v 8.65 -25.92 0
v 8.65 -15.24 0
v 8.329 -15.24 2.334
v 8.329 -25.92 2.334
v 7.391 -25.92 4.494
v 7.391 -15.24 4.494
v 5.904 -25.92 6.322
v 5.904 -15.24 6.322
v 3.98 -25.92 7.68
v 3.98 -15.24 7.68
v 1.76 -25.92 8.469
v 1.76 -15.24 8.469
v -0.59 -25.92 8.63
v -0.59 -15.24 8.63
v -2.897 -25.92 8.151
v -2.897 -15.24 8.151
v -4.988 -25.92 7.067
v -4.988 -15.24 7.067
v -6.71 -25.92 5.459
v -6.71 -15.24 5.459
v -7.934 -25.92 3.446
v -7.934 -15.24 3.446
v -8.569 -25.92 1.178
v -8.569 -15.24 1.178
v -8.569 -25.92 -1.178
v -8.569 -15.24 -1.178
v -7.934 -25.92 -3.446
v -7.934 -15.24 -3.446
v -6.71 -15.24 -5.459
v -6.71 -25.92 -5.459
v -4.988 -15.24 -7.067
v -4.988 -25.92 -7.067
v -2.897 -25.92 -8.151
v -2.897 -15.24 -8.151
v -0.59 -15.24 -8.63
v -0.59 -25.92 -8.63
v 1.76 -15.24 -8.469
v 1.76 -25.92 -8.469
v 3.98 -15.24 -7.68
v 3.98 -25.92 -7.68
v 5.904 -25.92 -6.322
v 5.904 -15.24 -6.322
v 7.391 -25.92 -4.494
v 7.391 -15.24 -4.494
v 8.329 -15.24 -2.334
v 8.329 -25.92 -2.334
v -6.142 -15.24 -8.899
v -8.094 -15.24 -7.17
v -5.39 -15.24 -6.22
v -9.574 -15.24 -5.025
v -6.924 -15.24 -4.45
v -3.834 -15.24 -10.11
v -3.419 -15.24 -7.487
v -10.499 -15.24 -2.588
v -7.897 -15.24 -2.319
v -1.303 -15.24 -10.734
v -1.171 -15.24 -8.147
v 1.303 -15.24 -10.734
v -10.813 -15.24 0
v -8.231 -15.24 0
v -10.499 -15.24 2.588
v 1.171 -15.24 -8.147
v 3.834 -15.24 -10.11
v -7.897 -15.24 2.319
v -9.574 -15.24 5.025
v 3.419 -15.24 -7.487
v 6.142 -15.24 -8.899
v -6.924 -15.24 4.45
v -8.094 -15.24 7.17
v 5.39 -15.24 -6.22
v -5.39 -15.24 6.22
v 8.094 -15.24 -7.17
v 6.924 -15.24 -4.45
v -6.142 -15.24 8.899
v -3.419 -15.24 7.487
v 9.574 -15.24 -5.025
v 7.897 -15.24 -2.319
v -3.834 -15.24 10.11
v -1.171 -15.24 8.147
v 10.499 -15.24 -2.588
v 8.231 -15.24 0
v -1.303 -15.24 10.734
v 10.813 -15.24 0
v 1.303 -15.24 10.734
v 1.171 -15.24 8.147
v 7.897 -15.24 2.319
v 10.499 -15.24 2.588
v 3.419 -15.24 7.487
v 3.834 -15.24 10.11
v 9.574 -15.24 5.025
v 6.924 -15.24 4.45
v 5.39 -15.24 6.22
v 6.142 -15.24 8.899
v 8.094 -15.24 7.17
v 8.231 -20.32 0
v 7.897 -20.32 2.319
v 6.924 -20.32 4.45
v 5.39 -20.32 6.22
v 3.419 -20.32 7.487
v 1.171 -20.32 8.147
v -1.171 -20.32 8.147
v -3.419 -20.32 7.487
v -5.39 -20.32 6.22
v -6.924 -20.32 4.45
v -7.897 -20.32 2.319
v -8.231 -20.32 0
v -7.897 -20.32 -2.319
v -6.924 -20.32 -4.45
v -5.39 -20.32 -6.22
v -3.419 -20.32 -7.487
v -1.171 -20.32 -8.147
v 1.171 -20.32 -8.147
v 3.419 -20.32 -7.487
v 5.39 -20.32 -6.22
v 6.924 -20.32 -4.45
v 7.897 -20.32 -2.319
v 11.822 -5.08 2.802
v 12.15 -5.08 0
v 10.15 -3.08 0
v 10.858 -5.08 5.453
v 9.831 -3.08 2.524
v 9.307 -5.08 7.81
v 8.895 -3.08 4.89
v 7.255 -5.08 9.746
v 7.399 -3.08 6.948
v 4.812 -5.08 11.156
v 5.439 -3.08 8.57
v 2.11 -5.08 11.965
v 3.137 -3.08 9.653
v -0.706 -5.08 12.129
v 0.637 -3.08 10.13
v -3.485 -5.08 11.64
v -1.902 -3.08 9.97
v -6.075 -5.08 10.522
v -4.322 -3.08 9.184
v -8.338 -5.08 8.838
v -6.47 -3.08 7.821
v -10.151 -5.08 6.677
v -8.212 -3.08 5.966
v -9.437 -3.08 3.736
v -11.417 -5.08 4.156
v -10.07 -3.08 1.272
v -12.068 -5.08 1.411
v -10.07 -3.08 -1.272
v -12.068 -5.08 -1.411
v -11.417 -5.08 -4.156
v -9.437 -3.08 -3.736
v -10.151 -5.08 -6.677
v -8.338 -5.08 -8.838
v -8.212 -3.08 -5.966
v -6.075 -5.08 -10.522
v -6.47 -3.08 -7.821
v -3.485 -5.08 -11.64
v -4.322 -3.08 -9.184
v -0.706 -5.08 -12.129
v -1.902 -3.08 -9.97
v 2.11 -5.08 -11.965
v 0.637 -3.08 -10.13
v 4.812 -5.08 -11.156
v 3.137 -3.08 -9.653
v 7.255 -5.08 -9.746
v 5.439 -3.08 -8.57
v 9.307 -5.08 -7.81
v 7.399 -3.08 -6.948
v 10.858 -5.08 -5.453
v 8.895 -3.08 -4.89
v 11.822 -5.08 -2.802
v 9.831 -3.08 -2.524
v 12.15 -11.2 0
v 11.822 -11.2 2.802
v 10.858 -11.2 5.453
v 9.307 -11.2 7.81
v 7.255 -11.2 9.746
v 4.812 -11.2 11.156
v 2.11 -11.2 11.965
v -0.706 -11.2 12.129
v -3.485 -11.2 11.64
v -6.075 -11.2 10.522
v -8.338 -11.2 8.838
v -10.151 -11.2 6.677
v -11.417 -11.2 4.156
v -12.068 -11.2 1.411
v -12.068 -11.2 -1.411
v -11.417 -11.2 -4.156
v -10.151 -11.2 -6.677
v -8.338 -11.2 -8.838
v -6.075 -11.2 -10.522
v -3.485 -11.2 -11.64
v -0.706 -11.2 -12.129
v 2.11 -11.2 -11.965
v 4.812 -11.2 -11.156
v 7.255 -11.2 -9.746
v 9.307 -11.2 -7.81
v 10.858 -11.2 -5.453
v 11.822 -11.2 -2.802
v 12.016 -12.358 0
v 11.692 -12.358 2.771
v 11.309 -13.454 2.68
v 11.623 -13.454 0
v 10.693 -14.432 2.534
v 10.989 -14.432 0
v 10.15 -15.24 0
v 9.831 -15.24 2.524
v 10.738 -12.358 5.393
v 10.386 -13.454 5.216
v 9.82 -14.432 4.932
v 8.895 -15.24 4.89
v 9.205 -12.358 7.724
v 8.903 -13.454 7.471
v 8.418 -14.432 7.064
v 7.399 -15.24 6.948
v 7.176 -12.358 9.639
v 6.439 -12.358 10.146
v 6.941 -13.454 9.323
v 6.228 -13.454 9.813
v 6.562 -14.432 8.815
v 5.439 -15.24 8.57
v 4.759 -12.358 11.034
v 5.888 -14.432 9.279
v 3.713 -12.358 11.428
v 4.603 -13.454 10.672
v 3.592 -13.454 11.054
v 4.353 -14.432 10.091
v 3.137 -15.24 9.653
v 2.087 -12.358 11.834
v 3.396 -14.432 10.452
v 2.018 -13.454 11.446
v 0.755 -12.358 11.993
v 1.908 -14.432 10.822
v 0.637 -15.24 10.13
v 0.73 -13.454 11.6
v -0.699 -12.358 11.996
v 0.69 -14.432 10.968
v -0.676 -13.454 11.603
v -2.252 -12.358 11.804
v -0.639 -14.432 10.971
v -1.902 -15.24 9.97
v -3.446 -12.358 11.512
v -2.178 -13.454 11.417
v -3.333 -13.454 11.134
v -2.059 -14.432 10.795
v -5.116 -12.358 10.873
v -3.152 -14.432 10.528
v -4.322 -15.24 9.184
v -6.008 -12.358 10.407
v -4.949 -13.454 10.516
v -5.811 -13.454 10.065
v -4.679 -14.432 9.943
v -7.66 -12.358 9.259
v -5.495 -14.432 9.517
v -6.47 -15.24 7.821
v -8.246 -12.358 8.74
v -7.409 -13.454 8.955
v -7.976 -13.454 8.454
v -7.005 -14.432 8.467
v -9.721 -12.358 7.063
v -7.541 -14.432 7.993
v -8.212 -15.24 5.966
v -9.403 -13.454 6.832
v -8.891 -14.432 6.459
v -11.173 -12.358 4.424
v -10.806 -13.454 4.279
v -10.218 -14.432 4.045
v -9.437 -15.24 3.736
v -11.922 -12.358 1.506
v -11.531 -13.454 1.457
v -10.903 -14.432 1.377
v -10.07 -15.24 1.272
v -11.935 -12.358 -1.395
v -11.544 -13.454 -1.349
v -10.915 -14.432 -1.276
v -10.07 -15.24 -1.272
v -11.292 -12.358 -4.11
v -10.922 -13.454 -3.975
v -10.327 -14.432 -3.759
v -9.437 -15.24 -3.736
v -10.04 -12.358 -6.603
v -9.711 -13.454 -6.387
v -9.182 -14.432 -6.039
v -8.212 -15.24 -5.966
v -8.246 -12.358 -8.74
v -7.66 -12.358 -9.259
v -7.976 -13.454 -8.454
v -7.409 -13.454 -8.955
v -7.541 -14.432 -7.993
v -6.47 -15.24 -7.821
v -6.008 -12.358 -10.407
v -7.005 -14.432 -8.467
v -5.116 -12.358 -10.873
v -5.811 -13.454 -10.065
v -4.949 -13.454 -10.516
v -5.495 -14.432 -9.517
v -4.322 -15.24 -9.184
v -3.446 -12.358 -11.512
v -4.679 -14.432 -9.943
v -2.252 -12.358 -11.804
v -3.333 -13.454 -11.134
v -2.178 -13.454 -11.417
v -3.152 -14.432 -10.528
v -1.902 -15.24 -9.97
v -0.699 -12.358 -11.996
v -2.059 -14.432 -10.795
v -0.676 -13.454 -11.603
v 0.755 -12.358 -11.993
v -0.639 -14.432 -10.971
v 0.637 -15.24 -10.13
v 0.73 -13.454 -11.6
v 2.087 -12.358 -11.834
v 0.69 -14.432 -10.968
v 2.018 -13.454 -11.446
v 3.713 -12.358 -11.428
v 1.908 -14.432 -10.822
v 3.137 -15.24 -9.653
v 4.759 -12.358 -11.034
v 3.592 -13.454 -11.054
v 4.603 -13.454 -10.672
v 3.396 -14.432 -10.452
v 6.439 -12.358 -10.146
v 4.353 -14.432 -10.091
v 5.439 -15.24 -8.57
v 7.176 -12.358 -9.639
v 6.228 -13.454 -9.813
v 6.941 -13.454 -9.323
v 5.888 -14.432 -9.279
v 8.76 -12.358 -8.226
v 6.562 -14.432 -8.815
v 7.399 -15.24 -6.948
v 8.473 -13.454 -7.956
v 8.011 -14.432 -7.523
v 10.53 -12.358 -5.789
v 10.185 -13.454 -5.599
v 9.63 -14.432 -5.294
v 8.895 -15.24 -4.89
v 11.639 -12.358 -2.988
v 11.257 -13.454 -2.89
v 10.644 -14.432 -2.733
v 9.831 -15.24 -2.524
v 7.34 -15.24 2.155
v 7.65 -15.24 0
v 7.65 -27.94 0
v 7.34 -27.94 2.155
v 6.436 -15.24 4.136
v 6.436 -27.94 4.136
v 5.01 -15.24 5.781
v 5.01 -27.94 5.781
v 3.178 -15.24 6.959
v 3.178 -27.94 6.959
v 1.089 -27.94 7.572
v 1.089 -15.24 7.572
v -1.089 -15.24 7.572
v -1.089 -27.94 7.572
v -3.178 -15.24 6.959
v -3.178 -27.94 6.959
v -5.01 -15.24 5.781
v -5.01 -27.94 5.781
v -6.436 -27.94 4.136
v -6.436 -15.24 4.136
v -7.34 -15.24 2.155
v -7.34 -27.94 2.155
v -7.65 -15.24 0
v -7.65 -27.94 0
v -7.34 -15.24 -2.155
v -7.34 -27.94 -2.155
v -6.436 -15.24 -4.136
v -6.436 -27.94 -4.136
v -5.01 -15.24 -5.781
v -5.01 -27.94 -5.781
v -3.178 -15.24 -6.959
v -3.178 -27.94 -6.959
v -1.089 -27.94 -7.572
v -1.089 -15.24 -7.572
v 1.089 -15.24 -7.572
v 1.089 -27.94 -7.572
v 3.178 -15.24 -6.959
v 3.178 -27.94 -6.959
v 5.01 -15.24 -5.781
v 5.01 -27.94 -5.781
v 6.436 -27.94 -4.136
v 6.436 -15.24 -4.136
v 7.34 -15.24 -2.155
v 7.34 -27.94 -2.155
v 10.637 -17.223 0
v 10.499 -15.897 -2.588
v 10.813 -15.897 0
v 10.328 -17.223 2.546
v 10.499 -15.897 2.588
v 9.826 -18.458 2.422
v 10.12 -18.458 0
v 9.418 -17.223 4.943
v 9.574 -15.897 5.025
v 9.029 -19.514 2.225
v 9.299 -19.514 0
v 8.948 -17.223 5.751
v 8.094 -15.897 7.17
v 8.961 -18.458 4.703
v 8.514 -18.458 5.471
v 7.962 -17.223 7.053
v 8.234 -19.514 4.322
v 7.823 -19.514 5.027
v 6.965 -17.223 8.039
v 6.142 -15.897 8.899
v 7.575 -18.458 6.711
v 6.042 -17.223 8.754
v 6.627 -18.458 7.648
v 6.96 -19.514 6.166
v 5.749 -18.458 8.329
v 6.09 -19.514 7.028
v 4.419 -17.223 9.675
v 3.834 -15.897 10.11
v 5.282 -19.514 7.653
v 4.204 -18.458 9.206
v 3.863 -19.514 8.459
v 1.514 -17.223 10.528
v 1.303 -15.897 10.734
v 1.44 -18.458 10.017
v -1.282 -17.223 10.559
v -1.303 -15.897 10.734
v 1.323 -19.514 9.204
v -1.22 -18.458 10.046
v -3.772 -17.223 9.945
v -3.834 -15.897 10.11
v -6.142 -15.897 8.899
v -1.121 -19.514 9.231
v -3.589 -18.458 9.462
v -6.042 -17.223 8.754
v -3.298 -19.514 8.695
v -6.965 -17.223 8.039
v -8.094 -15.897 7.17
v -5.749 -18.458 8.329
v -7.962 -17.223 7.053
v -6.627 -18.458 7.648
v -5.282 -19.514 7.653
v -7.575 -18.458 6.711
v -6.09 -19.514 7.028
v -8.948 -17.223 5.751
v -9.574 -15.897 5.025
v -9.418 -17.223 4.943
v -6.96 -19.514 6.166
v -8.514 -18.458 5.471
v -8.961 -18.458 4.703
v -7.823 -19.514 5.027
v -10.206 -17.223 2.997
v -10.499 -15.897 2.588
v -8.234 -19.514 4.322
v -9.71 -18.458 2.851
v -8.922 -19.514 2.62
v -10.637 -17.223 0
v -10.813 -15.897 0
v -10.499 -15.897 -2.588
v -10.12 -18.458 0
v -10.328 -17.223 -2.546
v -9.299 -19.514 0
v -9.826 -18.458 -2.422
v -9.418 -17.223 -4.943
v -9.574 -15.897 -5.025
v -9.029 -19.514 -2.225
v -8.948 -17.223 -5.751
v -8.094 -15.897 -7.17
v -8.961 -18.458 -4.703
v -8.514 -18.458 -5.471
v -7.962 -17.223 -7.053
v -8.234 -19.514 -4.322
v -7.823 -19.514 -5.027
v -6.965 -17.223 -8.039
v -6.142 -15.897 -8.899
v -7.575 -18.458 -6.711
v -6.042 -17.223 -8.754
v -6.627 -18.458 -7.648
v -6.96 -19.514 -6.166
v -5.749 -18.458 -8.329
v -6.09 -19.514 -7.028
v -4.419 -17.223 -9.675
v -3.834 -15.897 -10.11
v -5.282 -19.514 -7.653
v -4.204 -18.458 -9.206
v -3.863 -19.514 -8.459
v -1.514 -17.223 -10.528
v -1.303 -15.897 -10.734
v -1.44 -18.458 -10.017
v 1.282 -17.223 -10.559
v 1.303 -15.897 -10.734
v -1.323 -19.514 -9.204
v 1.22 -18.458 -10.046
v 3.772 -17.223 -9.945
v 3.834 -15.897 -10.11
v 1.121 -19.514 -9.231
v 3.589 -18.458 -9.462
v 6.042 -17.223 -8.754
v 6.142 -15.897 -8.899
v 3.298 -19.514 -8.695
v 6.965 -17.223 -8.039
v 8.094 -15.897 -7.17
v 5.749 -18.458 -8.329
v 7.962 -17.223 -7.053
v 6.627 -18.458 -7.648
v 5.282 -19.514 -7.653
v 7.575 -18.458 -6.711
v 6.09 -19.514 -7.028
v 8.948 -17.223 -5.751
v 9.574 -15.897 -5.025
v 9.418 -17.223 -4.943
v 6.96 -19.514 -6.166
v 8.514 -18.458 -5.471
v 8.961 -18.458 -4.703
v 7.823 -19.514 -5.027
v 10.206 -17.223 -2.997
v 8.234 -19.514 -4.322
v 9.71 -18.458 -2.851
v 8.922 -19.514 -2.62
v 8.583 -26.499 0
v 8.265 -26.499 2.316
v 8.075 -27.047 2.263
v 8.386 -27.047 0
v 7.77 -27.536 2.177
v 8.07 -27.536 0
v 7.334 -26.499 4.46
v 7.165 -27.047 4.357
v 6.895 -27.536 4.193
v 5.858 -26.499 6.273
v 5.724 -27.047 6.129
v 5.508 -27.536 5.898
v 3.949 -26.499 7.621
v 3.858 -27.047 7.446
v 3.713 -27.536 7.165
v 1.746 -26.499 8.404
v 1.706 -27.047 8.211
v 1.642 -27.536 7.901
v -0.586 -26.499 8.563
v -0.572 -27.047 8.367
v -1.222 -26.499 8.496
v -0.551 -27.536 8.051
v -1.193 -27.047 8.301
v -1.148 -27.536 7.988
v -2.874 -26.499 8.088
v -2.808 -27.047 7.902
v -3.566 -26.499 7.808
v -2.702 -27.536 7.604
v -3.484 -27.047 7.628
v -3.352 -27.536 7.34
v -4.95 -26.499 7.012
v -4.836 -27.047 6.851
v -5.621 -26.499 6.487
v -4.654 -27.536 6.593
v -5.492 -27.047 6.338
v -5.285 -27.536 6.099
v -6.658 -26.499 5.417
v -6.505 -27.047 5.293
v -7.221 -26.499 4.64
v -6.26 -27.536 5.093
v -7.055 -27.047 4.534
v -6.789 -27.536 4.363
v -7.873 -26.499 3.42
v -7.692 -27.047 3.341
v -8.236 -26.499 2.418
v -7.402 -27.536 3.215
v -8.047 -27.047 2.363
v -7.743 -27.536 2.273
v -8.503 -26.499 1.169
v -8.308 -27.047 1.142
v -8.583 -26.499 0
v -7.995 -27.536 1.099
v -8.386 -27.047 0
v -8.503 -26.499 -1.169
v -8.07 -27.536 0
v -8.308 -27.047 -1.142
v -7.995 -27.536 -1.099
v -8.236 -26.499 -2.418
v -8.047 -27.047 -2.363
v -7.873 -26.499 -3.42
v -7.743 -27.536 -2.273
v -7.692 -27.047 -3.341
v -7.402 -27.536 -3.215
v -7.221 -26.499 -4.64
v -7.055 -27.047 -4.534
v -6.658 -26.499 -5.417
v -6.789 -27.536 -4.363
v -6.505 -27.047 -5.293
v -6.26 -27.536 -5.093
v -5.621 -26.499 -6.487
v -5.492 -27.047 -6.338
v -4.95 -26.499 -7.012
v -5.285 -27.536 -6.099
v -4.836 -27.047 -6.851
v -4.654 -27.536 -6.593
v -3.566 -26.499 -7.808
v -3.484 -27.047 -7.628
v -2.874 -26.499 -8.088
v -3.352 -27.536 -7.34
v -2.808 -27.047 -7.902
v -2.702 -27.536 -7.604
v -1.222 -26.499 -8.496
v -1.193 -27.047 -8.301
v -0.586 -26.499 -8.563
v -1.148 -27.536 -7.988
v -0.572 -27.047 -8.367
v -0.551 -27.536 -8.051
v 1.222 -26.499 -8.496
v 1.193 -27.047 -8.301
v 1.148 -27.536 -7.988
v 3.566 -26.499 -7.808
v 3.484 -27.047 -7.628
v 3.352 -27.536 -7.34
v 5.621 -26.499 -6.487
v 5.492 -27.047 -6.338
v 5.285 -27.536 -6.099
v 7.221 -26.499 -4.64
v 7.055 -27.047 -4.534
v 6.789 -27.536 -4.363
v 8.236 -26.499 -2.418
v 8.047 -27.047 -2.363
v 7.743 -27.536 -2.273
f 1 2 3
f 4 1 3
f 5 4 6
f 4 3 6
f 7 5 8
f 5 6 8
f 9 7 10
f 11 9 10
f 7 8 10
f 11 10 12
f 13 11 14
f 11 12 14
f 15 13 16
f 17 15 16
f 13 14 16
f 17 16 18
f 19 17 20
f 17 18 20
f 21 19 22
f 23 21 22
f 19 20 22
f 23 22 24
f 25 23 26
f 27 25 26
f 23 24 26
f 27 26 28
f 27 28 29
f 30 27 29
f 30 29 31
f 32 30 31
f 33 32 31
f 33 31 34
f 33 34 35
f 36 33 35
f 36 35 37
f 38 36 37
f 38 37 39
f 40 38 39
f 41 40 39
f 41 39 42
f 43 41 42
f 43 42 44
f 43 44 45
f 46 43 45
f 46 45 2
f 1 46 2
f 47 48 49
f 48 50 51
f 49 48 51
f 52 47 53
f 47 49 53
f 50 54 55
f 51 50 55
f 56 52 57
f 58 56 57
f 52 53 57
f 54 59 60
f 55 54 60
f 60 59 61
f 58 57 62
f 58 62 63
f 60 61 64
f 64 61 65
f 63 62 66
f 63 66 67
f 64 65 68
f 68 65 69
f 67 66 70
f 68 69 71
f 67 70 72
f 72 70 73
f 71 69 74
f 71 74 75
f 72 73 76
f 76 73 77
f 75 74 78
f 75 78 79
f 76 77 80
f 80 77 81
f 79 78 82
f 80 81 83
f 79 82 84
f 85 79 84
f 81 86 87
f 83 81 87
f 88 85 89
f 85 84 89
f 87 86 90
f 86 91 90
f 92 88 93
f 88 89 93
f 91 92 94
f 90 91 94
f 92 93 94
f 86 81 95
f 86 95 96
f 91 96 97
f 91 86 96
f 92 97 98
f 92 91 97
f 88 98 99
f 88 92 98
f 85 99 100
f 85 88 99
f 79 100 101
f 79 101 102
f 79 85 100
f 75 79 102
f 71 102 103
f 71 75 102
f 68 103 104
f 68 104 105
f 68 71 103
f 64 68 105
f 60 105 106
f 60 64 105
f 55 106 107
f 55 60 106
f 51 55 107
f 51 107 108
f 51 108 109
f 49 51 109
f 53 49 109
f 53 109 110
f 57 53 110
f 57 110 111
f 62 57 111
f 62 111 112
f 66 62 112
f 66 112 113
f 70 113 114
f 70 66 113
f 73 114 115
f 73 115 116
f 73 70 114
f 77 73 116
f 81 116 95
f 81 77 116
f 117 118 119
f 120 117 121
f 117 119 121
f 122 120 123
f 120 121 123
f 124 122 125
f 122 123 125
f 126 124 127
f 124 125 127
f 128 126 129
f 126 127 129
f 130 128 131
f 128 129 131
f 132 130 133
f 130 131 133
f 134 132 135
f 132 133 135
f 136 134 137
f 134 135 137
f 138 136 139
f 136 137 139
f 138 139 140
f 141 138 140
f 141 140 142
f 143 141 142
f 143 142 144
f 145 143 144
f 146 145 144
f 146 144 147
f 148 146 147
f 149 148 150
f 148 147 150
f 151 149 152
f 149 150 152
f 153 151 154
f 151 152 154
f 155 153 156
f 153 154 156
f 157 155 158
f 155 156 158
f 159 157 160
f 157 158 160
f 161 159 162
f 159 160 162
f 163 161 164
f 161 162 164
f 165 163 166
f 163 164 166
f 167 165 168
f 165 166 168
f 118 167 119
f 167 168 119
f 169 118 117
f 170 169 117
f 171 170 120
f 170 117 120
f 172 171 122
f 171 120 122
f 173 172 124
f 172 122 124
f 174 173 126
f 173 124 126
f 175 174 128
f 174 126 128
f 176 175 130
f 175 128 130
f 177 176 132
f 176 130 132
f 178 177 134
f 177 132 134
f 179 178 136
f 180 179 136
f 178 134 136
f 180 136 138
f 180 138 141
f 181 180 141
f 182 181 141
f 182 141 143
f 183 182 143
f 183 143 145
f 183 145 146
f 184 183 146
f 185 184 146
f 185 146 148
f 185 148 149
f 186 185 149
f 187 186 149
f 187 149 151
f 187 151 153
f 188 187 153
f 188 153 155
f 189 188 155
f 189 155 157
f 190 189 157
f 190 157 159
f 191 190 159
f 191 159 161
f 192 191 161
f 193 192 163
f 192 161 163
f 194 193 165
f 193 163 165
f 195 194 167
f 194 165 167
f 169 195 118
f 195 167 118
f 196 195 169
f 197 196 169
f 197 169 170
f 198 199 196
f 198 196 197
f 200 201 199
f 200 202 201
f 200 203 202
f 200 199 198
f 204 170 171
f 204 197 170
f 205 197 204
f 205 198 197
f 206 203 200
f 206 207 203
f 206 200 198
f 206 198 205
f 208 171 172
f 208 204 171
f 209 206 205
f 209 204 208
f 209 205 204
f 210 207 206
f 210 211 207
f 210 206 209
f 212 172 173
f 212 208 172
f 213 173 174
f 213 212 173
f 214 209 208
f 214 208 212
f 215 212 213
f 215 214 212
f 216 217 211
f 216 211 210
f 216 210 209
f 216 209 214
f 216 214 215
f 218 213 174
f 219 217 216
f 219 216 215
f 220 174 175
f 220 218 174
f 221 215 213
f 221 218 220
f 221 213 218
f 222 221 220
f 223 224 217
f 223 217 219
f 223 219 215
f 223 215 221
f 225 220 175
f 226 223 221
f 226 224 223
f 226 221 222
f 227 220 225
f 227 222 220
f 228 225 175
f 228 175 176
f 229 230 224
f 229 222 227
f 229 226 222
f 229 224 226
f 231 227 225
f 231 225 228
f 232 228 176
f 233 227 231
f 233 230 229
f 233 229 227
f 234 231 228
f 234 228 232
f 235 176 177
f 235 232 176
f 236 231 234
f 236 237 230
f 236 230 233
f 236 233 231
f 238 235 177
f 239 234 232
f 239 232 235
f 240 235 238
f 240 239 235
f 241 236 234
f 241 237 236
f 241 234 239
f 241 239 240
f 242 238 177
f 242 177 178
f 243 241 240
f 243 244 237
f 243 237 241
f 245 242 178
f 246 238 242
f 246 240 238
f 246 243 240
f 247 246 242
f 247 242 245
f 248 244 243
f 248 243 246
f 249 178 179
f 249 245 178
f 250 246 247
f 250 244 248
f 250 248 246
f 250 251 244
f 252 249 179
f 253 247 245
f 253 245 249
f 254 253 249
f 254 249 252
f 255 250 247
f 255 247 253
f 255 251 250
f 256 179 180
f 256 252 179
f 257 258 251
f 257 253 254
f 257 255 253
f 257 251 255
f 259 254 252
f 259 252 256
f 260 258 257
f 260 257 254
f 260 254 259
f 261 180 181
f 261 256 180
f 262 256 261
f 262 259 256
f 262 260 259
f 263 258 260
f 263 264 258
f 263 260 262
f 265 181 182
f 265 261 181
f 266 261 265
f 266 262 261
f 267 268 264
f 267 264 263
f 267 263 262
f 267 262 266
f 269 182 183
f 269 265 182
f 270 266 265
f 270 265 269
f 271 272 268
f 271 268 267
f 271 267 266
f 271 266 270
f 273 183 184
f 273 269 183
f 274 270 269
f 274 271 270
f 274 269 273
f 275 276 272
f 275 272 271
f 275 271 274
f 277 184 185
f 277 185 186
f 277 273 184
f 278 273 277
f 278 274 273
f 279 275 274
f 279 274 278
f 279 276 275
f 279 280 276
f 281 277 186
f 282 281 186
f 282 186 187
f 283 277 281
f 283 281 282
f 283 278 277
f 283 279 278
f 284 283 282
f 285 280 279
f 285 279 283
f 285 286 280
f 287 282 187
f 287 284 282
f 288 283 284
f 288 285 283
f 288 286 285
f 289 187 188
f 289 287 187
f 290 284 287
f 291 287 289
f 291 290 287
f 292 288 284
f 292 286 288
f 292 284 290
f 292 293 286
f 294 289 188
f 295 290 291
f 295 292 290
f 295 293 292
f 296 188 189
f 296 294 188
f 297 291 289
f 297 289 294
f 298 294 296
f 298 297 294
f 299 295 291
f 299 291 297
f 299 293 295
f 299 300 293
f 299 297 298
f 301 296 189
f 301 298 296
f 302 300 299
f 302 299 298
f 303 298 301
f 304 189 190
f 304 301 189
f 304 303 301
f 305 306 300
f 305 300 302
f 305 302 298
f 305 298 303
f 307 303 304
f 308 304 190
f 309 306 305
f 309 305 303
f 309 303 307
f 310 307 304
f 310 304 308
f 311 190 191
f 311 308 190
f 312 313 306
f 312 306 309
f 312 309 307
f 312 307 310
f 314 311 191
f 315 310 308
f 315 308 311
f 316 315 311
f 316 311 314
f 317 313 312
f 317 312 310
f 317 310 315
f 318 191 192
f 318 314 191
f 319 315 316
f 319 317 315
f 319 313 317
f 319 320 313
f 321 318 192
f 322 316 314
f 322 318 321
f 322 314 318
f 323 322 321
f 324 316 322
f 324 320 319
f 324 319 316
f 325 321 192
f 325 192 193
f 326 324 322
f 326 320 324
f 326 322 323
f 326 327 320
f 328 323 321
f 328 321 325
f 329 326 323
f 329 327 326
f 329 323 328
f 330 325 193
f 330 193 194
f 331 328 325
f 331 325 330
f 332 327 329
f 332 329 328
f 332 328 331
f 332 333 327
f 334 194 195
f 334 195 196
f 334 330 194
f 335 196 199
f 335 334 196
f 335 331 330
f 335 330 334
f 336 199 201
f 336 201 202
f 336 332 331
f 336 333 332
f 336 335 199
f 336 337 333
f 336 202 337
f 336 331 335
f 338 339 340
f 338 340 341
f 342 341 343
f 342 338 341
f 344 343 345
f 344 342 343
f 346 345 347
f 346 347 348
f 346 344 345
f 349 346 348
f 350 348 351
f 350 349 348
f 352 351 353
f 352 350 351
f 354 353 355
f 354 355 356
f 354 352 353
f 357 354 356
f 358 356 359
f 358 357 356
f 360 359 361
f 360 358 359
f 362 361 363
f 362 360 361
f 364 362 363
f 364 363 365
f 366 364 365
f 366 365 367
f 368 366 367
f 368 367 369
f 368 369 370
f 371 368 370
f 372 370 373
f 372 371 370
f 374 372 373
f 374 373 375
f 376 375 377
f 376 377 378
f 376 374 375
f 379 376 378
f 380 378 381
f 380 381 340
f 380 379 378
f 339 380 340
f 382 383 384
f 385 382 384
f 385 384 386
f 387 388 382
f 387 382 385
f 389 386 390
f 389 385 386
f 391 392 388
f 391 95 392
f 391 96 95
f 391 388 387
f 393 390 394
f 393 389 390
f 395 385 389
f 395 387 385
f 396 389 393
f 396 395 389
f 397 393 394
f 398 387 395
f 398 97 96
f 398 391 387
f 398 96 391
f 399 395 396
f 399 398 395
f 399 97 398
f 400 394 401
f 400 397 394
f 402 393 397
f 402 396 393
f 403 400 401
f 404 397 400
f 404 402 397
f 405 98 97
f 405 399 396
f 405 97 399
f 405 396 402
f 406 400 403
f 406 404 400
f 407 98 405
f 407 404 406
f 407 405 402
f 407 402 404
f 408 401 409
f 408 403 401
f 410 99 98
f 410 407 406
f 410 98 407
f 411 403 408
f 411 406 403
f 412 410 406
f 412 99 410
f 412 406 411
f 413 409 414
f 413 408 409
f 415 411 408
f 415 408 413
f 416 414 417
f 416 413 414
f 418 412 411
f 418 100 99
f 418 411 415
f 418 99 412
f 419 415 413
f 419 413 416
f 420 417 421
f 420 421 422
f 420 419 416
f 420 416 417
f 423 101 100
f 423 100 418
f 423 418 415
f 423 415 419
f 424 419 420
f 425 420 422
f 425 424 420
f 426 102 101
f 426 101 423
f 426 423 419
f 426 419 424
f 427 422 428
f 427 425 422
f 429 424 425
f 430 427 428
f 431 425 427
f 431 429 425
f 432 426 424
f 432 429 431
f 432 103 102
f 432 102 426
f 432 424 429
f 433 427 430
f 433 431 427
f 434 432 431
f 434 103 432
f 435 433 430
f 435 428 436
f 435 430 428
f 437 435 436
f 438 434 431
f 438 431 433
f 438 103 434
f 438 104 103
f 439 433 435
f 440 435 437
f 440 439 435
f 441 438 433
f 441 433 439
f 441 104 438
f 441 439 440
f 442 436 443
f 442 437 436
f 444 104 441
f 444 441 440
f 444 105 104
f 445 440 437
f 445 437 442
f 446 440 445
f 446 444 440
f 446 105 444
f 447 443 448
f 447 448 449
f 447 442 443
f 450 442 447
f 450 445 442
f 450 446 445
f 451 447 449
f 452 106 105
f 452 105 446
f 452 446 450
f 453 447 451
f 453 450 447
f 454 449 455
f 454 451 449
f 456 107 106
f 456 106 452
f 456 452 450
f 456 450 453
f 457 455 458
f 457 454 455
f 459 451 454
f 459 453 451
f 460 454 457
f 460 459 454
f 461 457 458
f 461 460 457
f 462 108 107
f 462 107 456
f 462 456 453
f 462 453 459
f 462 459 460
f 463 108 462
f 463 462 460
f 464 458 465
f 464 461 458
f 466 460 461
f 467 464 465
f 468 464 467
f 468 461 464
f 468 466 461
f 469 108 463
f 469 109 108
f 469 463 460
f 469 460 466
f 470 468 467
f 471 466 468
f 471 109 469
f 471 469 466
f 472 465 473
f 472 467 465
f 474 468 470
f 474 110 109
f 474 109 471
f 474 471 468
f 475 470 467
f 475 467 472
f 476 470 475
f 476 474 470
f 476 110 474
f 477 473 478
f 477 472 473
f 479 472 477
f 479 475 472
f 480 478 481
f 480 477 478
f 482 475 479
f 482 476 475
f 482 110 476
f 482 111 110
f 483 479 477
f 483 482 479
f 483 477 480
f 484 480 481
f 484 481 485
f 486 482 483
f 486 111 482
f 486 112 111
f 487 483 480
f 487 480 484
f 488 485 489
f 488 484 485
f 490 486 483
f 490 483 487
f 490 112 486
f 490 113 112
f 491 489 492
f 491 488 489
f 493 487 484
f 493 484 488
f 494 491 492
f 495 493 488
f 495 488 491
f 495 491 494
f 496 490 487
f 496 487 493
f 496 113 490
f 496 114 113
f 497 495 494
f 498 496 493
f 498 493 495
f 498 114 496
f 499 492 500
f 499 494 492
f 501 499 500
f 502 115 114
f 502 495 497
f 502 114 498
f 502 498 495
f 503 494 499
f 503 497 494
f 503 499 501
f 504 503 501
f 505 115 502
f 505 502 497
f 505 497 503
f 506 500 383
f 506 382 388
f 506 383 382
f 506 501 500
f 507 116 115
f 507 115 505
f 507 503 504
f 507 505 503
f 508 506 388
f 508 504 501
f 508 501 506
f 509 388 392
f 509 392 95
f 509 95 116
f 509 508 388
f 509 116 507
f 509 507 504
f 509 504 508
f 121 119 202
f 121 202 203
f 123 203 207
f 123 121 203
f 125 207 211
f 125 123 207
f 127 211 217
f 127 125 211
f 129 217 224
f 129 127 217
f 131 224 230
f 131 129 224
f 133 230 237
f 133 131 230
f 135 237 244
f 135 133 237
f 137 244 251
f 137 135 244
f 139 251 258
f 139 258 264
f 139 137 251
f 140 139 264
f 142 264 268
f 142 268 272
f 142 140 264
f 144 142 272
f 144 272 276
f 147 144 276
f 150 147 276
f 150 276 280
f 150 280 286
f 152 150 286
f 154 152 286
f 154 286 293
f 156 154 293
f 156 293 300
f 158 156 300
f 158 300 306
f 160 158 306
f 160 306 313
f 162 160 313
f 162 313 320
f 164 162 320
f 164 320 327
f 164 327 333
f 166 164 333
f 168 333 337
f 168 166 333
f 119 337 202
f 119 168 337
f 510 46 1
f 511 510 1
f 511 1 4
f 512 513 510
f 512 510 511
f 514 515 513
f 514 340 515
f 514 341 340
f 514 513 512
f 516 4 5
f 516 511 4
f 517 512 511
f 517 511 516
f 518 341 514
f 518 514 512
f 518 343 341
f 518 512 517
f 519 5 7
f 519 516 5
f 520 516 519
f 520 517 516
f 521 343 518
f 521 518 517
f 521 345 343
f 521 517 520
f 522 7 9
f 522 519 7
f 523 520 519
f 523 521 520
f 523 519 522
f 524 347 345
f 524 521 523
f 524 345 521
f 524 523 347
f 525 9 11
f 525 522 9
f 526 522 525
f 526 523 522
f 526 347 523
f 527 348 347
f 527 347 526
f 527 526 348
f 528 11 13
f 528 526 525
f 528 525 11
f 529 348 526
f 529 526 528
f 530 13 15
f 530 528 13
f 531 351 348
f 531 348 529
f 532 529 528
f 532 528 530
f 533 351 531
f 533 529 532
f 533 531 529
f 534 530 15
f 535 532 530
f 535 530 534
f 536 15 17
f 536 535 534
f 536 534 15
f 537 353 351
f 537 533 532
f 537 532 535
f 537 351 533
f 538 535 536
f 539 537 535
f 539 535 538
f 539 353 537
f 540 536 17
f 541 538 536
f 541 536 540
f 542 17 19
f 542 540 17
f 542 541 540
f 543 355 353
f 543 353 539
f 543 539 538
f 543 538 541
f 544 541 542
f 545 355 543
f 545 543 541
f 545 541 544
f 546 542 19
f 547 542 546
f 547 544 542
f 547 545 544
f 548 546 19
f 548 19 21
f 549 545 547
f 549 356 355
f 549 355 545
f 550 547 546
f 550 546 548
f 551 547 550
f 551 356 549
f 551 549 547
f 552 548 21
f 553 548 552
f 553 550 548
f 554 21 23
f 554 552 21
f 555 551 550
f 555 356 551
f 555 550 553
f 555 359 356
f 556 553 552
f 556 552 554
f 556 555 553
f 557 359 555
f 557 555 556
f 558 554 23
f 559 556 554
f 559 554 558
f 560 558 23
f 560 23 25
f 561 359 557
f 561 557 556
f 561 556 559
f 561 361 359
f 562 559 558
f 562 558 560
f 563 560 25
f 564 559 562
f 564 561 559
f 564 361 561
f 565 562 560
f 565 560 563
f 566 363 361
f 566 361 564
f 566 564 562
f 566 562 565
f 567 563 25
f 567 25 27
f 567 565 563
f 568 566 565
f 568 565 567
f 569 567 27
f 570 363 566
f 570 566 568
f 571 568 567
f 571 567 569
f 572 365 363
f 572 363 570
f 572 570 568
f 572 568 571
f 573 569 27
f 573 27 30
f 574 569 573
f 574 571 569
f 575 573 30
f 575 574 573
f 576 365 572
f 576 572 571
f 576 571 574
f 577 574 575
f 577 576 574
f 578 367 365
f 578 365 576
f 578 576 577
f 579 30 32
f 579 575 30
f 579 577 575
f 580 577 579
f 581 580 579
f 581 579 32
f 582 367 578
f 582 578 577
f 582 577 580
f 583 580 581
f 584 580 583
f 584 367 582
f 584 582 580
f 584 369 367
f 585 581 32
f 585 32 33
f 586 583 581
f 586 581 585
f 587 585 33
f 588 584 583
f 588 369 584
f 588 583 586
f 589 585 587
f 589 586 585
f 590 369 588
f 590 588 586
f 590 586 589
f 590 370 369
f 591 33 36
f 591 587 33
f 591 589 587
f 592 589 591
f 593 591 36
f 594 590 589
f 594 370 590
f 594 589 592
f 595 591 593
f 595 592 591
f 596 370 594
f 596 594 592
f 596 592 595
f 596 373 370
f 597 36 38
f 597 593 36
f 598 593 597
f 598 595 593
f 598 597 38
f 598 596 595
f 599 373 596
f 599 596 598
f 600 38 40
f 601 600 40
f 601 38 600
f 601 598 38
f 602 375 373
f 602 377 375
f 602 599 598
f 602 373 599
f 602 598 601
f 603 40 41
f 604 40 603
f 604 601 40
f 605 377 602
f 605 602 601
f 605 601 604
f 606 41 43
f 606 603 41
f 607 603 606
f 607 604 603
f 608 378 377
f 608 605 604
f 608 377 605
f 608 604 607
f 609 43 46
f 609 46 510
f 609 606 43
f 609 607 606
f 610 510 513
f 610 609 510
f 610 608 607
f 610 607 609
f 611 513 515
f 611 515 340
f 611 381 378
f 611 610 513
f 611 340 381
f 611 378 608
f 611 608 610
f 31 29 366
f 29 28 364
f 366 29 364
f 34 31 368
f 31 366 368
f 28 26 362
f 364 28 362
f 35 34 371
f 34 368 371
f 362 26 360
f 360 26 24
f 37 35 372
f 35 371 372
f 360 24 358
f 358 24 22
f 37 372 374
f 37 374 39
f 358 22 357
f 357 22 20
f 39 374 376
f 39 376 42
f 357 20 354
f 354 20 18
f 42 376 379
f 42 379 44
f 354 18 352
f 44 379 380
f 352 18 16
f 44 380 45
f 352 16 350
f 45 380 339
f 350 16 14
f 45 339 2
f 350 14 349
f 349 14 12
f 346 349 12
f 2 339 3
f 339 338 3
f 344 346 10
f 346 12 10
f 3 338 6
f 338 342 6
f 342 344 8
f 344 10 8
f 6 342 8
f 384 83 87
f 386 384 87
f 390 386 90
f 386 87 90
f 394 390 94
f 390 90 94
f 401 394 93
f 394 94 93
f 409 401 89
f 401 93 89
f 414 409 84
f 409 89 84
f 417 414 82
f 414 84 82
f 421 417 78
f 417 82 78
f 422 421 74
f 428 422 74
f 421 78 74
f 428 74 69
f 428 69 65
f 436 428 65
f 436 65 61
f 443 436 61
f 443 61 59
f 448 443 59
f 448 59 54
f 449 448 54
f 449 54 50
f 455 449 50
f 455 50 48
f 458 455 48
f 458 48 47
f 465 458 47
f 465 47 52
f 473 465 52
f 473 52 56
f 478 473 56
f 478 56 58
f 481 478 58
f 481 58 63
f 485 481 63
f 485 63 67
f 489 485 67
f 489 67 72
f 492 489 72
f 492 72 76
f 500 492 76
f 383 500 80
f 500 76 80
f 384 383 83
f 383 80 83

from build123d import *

# Parameters (mm, degrees)
F0_R     = 12.15
F0_R_2   = 10.15
F1_DEPTH = 15.24
F2_R     = 8.65
F2_R_2   = 7.65
F3_DEPTH = 12.7
F4_R     = 10.8128537481
F4_R_2   = 8.2306905139
F5_DEPTH = 5.08


# Not quite as in the source:
# - a fillet or chamfer that OpenCascade refuses, or shapes differently, is made with other operations: its cross-section is extruded or revolved along the edge and cut away or added


with BuildPart() as f1:
    # F0 (on Front) → F1 (new body)
    with BuildSketch(Plane.XZ):
        Circle(F0_R)
        Circle(F0_R_2, mode=Mode.SUBTRACT)
    extrude(amount=F1_DEPTH)

    # F6: fillet of radius 5.08 on 1 edges, made by hand

    # F6_s1 → F6_t2 (revolve, cut)
    with BuildSketch(Plane.XY):
        with BuildLine():
            ThreePointArc((12.15, -11.2001980247), (11.6226256161, -13.4540835586), (10.15, -15.24))
            Line((10.15, -15.24), (12.15, -15.24))
            Line((12.15, -15.24), (12.15, -11.2001980247))
        make_face()
    revolve(axis=Axis((0, -15.24, 0), (0, -1, 0)), mode=Mode.SUBTRACT)

    # F9: chamfer of 5.08 on 1 edges, made by hand

    # F9_s1 → F9_t2 (revolve, cut)
    with BuildSketch(Plane.XY):
        Polygon((12.15, -5.08), (7.07, 0), (12.15, 0), align=None)
    revolve(axis=Axis((0, 0, 0), (0, -1, 0)), mode=Mode.SUBTRACT)


with BuildPart() as f3:
    # F2 (on face) → F3 (new body)
    with BuildSketch(Plane.XZ.offset(15.24)):
        Circle(F2_R)
        Circle(F2_R_2, mode=Mode.SUBTRACT)
    extrude(amount=F3_DEPTH)

    # F8: fillet of radius 2.54 on 1 edges, made by hand

    # F8_s1 → F8_t2 (revolve, cut)
    with BuildSketch(Plane.XY):
        with BuildLine():
            ThreePointArc((8.65, -25.9200990123), (8.386312808, -27.0470417793), (7.65, -27.94))
            Line((7.65, -27.94), (8.65, -27.94))
            Line((8.65, -27.94), (8.65, -25.9200990123))
        make_face()
    revolve(axis=Axis((0, -27.94, 0), (0, -1, 0)), mode=Mode.SUBTRACT)


with BuildPart() as f5:
    # F4 (on face) → F5 (new body)
    with BuildSketch(Plane.XZ.offset(15.24)):
        Circle(F4_R)
        Circle(F4_R_2, mode=Mode.SUBTRACT)
    extrude(amount=F5_DEPTH)

    # F7: fillet of radius 5.08 on 1 edges, made by hand

    # F7_s1 → F7_t2 (revolve, cut)
    with BuildSketch(Plane.XY):
        with BuildLine():
            ThreePointArc((10.8128537481, -15.8965159104), (10.1200744383, -18.457510759), (8.2306905139, -20.32))
            Line((8.2306905139, -20.32), (10.8128537481, -20.32))
            Line((10.8128537481, -20.32), (10.8128537481, -15.8965159104))
        make_face()
    revolve(axis=Axis((0, -20.32, 0), (0, -1, 0)), mode=Mode.SUBTRACT)


solid = Compound([f1.part, f3.part, f5.part])
